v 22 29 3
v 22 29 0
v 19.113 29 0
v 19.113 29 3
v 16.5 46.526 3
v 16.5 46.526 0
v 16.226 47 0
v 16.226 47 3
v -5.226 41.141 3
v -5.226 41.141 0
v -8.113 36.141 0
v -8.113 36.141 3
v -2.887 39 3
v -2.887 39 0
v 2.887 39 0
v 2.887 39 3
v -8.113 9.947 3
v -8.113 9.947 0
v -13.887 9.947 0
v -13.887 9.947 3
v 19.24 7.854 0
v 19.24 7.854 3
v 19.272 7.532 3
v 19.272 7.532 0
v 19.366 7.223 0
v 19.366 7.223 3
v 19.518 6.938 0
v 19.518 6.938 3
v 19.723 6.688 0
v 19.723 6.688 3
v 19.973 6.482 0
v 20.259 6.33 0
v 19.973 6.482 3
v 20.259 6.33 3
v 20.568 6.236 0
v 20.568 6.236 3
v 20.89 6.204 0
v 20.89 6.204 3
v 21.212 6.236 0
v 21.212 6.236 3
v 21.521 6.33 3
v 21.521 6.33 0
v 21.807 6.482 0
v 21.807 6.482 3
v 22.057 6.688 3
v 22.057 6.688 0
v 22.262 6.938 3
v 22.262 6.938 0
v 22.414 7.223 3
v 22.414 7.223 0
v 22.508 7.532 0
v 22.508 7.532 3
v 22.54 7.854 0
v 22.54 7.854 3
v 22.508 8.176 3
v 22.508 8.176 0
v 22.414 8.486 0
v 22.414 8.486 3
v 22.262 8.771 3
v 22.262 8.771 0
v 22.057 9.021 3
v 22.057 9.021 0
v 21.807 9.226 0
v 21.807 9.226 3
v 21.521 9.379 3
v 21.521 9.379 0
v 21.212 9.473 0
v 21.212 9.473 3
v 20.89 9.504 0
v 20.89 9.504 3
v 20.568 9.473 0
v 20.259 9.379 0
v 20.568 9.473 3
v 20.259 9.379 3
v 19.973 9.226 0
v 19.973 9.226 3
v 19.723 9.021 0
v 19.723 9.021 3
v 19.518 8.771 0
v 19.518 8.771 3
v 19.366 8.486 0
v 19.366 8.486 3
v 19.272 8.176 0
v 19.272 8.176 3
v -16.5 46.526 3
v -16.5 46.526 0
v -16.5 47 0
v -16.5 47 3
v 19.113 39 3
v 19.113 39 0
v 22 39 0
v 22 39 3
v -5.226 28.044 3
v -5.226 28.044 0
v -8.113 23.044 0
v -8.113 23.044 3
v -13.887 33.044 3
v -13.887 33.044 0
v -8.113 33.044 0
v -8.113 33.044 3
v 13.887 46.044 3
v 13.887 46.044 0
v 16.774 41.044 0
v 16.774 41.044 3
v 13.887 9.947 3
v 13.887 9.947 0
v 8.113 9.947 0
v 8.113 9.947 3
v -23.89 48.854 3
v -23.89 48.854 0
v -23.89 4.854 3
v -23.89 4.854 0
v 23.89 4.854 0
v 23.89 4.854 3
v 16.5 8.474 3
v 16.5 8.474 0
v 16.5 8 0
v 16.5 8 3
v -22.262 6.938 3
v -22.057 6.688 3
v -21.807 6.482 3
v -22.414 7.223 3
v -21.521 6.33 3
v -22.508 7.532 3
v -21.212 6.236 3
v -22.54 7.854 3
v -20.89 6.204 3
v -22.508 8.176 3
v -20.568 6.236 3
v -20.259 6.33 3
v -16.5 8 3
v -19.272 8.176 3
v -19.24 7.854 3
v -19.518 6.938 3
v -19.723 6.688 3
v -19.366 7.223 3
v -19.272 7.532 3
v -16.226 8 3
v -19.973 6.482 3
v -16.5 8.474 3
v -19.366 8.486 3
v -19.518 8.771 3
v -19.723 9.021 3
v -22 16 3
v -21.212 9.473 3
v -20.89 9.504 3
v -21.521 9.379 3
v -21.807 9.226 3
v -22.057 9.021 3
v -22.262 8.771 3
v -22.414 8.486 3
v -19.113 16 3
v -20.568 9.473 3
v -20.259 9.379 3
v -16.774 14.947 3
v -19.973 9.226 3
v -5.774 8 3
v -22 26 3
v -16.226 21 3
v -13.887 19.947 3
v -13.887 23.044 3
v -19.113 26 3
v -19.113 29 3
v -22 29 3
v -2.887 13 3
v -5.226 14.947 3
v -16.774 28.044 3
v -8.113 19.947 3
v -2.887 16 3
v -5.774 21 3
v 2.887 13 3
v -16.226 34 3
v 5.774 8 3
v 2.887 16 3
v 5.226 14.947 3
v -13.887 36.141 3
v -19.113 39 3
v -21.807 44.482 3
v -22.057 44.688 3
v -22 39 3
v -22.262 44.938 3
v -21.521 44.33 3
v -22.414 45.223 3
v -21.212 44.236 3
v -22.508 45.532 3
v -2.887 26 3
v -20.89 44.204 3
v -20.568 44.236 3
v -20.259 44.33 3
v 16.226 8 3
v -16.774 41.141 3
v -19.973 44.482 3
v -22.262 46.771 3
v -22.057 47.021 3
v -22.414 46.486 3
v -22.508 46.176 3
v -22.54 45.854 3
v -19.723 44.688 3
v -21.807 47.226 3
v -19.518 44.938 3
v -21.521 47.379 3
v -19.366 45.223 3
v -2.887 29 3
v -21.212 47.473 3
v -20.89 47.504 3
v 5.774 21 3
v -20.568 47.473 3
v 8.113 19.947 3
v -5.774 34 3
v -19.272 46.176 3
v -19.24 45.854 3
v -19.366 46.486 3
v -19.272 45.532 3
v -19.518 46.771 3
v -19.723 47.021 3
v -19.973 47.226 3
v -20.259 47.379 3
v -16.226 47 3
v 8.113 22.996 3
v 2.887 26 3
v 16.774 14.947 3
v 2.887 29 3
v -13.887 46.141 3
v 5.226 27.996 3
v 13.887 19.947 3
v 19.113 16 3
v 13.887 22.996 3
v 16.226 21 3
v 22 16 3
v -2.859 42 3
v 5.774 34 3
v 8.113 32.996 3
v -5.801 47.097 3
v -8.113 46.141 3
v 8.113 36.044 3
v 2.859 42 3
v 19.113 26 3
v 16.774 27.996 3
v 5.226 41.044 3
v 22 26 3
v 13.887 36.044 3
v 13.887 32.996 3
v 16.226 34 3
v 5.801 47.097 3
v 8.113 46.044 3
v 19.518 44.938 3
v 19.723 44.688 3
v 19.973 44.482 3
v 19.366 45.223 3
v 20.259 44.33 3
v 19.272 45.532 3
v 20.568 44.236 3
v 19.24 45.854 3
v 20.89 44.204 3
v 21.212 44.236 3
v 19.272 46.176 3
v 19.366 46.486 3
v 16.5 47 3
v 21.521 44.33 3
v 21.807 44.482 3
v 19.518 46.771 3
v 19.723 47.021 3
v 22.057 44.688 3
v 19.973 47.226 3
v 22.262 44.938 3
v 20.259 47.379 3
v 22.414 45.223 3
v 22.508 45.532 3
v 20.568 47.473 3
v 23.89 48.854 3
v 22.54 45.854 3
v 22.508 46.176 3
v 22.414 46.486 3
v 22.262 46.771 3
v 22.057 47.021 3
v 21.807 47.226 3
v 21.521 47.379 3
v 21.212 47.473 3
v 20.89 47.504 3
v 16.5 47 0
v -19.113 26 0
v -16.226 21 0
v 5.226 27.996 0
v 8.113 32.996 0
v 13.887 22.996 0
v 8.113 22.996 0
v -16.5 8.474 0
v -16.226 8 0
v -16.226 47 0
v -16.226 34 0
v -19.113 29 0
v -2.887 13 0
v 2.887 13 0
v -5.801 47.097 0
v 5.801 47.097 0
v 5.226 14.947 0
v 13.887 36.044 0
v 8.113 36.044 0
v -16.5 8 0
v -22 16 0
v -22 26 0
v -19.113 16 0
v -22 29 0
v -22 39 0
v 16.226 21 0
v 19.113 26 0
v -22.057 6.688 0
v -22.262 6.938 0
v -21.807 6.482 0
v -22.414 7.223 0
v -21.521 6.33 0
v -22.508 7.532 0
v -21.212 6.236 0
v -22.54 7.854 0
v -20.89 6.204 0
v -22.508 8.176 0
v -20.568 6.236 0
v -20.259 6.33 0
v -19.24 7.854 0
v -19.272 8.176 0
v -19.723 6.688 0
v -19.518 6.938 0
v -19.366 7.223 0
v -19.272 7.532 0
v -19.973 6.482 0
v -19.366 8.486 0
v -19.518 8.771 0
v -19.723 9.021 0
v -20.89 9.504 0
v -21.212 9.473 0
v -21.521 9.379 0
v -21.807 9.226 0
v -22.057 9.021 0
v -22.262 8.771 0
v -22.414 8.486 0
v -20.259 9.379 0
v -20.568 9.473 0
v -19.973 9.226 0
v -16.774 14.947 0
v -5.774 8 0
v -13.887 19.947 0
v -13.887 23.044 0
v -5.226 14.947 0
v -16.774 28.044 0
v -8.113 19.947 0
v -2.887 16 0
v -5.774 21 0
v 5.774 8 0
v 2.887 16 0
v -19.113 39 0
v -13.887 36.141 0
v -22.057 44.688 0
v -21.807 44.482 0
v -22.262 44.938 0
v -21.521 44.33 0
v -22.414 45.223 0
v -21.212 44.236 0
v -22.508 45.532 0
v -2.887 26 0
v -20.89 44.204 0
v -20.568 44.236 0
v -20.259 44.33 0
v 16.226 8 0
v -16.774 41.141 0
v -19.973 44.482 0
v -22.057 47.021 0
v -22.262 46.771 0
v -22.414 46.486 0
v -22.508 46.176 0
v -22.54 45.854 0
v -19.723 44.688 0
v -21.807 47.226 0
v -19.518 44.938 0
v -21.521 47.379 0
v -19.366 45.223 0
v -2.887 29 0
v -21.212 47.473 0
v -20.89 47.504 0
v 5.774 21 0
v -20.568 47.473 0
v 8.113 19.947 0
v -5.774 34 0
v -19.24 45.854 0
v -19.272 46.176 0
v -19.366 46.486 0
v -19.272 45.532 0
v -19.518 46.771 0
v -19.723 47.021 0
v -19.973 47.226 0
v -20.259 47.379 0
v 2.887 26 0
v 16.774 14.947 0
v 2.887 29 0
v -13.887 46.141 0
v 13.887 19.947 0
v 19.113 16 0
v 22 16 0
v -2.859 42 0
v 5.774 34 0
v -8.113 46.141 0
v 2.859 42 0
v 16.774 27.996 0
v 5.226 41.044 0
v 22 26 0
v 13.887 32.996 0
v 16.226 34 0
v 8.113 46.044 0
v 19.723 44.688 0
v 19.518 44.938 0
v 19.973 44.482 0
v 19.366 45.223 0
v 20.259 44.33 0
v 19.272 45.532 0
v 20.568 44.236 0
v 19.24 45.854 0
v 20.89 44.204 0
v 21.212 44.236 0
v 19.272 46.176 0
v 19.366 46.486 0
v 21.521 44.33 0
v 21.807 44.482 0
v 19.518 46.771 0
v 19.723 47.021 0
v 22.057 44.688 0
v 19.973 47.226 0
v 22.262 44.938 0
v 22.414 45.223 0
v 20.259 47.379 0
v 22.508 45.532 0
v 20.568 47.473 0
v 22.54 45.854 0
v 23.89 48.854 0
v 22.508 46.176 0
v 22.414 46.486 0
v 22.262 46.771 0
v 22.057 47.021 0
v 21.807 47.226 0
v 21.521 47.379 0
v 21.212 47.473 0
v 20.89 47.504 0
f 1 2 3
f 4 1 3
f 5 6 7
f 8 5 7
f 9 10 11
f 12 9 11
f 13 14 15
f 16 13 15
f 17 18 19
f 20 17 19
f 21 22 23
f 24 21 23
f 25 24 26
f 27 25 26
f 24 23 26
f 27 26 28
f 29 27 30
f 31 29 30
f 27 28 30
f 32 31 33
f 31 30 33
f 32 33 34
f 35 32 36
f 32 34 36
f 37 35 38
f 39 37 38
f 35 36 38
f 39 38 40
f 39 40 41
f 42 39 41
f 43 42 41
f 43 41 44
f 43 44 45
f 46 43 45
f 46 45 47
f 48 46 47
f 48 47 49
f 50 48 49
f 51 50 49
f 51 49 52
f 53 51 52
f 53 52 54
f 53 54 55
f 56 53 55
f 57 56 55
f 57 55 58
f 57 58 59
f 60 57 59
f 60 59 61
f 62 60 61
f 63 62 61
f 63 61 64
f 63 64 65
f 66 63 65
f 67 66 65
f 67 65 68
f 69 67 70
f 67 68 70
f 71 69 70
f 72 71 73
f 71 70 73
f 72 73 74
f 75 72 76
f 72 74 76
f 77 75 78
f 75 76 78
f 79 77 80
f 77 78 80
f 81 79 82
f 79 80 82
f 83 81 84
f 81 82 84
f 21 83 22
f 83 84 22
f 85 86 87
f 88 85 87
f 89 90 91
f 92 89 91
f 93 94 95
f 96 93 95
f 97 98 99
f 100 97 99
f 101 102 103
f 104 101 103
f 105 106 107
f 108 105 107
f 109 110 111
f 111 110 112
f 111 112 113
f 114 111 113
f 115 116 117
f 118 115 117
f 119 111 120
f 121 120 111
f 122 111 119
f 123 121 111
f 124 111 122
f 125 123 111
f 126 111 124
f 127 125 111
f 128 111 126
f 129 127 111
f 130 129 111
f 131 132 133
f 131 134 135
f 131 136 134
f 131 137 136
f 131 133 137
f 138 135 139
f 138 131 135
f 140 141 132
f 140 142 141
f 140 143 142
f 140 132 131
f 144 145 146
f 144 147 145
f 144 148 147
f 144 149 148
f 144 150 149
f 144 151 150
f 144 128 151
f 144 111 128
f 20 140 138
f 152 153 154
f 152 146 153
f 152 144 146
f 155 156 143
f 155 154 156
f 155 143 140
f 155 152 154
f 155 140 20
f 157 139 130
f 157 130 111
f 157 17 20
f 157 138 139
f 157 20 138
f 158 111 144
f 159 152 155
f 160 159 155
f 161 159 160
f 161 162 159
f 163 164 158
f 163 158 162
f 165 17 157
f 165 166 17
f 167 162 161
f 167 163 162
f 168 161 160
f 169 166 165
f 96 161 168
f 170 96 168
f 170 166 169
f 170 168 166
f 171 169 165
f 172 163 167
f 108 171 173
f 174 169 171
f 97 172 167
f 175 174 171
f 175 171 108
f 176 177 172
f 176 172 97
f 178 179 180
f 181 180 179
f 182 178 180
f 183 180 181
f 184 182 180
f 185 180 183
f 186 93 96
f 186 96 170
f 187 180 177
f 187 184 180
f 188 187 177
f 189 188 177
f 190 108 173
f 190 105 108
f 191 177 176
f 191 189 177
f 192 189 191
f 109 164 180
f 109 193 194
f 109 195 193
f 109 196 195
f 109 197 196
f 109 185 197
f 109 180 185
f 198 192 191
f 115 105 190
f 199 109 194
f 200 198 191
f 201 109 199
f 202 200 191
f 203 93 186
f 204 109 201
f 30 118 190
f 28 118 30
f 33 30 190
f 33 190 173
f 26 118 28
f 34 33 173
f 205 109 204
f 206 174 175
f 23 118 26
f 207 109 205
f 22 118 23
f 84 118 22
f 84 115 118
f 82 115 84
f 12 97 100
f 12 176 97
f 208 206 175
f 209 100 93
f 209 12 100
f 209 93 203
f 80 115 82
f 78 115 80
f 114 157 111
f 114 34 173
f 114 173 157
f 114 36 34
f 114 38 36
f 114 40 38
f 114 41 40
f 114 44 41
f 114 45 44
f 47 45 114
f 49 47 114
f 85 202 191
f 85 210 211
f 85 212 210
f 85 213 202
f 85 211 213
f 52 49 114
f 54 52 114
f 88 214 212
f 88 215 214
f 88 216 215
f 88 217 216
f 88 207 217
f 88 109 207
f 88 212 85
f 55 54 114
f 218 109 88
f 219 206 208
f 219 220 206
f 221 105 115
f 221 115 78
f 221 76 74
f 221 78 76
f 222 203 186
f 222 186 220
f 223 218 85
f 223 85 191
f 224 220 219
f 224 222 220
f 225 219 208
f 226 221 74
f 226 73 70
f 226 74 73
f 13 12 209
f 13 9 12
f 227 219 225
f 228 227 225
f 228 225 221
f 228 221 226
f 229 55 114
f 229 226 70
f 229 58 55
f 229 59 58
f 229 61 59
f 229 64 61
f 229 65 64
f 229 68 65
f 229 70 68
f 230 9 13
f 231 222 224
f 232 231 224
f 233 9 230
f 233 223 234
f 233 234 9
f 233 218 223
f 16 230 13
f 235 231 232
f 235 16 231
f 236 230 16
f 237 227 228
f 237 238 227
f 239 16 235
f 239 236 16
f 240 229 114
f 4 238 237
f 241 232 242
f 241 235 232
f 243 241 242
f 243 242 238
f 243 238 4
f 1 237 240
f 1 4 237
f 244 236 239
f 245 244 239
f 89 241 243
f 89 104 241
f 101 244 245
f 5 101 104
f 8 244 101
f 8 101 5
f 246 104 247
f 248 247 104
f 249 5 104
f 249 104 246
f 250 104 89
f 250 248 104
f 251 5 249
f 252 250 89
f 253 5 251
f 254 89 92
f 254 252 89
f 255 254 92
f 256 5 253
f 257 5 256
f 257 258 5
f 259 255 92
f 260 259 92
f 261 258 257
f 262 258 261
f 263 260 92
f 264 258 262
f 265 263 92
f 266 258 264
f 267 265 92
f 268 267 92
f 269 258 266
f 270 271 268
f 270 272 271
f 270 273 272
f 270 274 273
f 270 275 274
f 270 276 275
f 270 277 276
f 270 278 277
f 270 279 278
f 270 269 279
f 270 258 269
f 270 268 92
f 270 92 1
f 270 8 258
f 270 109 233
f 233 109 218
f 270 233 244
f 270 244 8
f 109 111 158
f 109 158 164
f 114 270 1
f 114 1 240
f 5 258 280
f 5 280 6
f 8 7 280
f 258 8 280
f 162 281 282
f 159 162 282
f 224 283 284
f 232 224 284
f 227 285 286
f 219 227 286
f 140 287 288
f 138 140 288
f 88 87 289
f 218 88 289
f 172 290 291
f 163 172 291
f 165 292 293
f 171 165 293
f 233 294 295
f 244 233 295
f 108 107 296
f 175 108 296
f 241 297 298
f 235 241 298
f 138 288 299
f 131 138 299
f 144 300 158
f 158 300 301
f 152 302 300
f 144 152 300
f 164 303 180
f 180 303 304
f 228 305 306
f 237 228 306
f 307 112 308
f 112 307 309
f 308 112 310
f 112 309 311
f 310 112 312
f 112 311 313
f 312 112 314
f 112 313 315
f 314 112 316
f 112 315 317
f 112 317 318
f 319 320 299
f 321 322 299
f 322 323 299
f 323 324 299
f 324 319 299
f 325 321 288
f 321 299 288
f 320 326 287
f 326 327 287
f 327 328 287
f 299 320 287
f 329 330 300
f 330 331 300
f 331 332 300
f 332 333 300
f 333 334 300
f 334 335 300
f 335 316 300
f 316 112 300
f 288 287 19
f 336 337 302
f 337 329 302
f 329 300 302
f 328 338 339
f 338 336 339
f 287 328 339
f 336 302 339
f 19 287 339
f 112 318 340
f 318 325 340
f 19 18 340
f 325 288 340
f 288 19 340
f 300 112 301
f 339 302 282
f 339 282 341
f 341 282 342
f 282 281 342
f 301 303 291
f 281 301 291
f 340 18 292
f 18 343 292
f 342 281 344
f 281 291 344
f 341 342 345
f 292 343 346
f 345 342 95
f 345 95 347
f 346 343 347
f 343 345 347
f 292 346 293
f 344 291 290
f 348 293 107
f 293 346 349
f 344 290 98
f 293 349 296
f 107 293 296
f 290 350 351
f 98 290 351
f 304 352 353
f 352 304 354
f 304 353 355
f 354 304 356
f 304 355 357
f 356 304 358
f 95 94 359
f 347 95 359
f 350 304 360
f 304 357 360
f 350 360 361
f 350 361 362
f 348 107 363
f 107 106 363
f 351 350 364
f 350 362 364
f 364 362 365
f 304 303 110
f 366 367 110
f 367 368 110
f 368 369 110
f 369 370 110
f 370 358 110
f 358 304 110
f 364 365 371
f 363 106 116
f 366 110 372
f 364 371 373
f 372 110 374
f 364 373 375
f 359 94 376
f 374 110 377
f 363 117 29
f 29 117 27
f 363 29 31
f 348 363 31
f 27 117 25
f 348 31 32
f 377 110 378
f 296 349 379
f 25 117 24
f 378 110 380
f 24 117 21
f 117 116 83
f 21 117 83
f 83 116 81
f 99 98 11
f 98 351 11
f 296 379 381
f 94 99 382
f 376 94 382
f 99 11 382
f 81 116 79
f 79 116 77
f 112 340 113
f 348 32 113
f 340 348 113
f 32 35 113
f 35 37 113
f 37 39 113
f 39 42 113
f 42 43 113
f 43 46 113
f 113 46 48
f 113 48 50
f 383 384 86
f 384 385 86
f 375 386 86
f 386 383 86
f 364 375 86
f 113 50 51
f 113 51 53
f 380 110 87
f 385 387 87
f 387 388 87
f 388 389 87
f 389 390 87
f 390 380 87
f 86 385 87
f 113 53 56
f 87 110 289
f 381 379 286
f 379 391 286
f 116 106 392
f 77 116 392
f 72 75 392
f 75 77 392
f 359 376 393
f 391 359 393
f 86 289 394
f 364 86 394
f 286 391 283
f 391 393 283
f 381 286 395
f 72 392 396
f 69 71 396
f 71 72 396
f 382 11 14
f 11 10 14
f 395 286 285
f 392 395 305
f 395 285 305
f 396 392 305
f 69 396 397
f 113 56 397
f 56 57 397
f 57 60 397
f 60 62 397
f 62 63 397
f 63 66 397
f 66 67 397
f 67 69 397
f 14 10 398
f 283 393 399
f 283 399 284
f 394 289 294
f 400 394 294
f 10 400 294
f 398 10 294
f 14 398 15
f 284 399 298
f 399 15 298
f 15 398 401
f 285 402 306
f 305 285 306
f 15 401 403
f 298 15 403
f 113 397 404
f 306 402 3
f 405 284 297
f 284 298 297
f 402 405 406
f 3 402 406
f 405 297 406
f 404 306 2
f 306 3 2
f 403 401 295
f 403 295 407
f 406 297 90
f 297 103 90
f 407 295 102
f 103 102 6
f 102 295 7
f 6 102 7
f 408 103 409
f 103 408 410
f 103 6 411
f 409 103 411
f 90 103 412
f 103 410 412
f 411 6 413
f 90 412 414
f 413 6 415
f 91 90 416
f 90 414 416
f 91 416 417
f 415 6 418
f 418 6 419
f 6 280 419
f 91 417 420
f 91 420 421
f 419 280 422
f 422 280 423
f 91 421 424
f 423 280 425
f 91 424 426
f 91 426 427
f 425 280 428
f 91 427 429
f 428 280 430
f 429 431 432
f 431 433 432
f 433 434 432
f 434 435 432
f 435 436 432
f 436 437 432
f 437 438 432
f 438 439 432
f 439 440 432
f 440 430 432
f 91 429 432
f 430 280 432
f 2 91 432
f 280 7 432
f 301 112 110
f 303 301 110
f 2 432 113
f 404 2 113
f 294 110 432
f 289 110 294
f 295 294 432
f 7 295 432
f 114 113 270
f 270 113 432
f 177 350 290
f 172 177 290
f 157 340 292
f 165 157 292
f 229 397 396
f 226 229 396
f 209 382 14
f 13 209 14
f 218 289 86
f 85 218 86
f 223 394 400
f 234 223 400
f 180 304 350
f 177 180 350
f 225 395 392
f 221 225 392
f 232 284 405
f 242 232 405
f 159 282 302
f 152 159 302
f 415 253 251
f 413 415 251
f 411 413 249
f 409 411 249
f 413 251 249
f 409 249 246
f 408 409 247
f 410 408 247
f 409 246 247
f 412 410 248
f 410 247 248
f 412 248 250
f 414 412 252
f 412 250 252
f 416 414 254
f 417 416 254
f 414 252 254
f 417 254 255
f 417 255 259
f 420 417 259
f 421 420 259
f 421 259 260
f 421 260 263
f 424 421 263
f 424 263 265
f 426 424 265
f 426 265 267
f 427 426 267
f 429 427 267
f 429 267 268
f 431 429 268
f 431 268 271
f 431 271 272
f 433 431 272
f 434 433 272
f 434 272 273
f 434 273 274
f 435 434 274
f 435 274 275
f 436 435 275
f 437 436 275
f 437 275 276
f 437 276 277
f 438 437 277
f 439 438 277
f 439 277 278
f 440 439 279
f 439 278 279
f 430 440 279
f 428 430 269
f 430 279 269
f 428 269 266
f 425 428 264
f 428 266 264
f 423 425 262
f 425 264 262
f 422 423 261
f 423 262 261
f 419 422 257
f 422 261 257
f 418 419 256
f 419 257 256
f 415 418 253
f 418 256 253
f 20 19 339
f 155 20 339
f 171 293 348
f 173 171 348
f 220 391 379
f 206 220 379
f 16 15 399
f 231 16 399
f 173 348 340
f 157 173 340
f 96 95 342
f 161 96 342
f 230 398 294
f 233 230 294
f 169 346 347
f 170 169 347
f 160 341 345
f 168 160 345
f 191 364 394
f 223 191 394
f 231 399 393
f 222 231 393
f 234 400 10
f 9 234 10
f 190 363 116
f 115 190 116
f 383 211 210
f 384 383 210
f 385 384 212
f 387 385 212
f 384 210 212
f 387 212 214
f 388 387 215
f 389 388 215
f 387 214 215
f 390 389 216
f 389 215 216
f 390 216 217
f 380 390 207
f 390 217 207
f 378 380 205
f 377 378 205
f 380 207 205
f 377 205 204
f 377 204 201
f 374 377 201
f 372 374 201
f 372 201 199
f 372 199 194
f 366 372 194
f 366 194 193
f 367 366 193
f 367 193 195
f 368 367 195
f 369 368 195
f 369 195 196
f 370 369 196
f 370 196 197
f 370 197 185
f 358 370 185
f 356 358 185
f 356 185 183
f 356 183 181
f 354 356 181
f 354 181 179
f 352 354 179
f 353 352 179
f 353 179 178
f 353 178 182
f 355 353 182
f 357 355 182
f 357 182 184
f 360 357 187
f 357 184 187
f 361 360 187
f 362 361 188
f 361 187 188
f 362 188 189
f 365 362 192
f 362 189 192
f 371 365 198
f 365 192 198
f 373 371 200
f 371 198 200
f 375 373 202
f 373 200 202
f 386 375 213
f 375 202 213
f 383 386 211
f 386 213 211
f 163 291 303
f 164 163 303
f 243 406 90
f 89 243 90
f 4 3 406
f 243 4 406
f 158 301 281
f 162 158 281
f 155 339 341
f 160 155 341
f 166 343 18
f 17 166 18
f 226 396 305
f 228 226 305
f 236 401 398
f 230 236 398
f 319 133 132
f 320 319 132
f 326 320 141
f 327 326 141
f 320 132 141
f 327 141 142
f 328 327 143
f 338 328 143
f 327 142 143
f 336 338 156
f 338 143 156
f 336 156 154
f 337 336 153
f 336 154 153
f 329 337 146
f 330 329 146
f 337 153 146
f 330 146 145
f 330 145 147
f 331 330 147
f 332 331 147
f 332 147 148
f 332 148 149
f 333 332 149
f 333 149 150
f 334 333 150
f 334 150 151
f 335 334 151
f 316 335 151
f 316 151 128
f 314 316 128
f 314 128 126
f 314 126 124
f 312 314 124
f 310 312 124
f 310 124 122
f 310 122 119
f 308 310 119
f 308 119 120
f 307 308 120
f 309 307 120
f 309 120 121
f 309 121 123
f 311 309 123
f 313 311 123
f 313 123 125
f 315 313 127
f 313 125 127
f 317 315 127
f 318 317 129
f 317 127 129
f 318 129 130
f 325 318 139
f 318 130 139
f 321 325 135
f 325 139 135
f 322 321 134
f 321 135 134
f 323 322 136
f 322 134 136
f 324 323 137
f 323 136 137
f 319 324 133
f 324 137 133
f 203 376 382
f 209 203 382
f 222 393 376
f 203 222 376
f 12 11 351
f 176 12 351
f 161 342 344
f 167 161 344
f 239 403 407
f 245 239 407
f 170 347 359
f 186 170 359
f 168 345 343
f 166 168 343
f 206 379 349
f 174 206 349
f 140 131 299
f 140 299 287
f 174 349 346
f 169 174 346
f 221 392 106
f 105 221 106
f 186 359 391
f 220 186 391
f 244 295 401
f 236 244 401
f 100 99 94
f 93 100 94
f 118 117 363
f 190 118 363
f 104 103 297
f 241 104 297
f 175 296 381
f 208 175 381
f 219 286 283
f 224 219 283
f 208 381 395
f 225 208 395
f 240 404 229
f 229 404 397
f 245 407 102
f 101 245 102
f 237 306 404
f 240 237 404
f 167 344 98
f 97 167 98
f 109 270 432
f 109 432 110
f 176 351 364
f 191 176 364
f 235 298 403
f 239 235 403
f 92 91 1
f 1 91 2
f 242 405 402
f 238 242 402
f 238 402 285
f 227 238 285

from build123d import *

# Parameters (mm, degrees)
RESSALTO_EXTRUS_O2_DEPTH = 3
RESSALTO_EXTRUS_O3_DEPTH = 3
ESBO_O4_R                = 1.65
CORTE_EXTRUS_O2_DEPTH    = 55.465328173


with BuildPart() as part:
    # Esboço1 → Ressalto-extrusão2 (new body)
    with BuildSketch(Plane.XY):
        Polygon((-23.89, 48.854271798), (-23.89, 4.854271798), (-18.042684332, 4.854271798), (3.957315668, 4.854271798), (18.042684332, 4.854271798), (23.89, 4.854271798), (23.89, 48.854271798), align=None)
        Polygon((19.113248654, 42), (16.226497308, 47), (22, 47), (22, 42), align=None, mode=Mode.SUBTRACT)
        Polygon((-16.226497308, 8), (-22, 8), (-22, 13), (-19.113248654, 13), align=None, mode=Mode.SUBTRACT)
        Polygon((-8.113248654, 19.947441117), (-5.226497308, 14.947441117), (-8.113248654, 9.947441117), (-13.886751346, 9.947441117), (-16.773502692, 14.947441117), (-13.886751346, 19.947441117), align=None, mode=Mode.SUBTRACT)
        Polygon((-19.113248654, 16), (-22, 16), (-22, 26), (-19.113248654, 26), (-16.226497308, 21), align=None, mode=Mode.SUBTRACT)
        Polygon((-2.886751346, 13), (2.886751346, 13), (5.773502692, 8), (-5.773502692, 8), align=None, mode=Mode.SUBTRACT)
        Polygon((22, 8), (16.226497308, 8), (19.113248654, 13), (22, 13), align=None, mode=Mode.SUBTRACT)
        Polygon((13.886751346, 19.947441117), (16.773502692, 14.947441117), (13.886751346, 9.947441117), (8.113248654, 9.947441117), (5.226497308, 14.947441117), (8.113248654, 19.947441117), align=None, mode=Mode.SUBTRACT)
        Polygon((-2.886751346, 26), (2.886751346, 26), (5.773502692, 21), (2.886751346, 16), (-2.886751346, 16), (-5.773502692, 21), align=None, mode=Mode.SUBTRACT)
        Polygon((22, 16), (19.113248654, 16), (16.226497308, 21), (19.113248654, 26), (22, 26), align=None, mode=Mode.SUBTRACT)
        Polygon((-19.113248654, 29), (-22, 29), (-22, 39), (-19.113248654, 39), (-16.226497308, 34), align=None, mode=Mode.SUBTRACT)
        Polygon((-8.113248654, 33.044060566), (-5.226497308, 28.044060566), (-8.113248654, 23.044060566), (-13.886751346, 23.044060566), (-16.773502692, 28.044060566), (-13.886751346, 33.044060566), align=None, mode=Mode.SUBTRACT)
        Polygon((-19.113248654, 42), (-22, 42), (-22, 47), (-16.226497308, 47), align=None, mode=Mode.SUBTRACT)
        Polygon((-8.113248654, 46.140680015), (-5.226497308, 41.140680015), (-8.113248654, 36.140680015), (-13.886751346, 36.140680015), (-16.773502692, 41.140680015), (-13.886751346, 46.140680015), align=None, mode=Mode.SUBTRACT)
        Polygon((-2.886751346, 39), (2.886751346, 39), (5.773502692, 34), (2.886751346, 29), (-2.886751346, 29), (-5.773502692, 34), align=None, mode=Mode.SUBTRACT)
        Polygon((13.886751346, 32.995750841), (16.773502692, 27.995750841), (13.886751346, 22.995750841), (8.113248654, 22.995750841), (5.226497308, 27.995750841), (8.113248654, 32.995750841), align=None, mode=Mode.SUBTRACT)
        Polygon((19.113248654, 39), (22, 39), (22, 29), (19.113248654, 29), (16.226497308, 34), align=None, mode=Mode.SUBTRACT)
        Polygon((-5.801394324, 47.096619449), (5.801394324, 47.096619449), (2.858859713, 42), (-2.858859713, 42), align=None, mode=Mode.SUBTRACT)
        Polygon((13.886751346, 46.044060566), (16.773502692, 41.044060566), (13.886751346, 36.044060566), (8.113248654, 36.044060566), (5.226497308, 41.044060566), (8.113248654, 46.044060566), align=None, mode=Mode.SUBTRACT)
    extrude(amount=RESSALTO_EXTRUS_O2_DEPTH)

    # Esboço2 → Ressalto-extrusão3 (add)
    with BuildSketch(Plane.XY.offset(3)):
        Polygon((22.5, 48.854271798), (-22.5, 48.854271798), (-22.5, 42), (-16.5, 42), (-16.5, 47.096619449), (16.5, 47.096619449), (16.5, 42), (22.5, 42), align=None)
        Polygon((-22.5, 13), (-22.5, 4.854271798), (22.5, 4.854271798), (22.5, 13), (16.5, 13), (16.5, 8), (-16.5, 8), (-16.5, 13), align=None)
    extrude(amount=-RESSALTO_EXTRUS_O3_DEPTH)

    # Esboço4 → Corte-extrusão2 (cut, through all)
    with BuildSketch(Plane.XY.offset(3)):
        with Locations((-20.89, 45.854271798)):
            Circle(ESBO_O4_R)
        with Locations((-20.89, 7.854271798)):
            Circle(ESBO_O4_R)
        with Locations(Location((20.89, 7.854271798, 0), (0, 0, 180))):
            Circle(ESBO_O4_R)
        with Locations(Location((20.89, 45.854271798, 0), (0, 0, 180))):
            Circle(ESBO_O4_R)
    extrude(amount=-CORTE_EXTRUS_O2_DEPTH, mode=Mode.SUBTRACT)


solid = part.part
